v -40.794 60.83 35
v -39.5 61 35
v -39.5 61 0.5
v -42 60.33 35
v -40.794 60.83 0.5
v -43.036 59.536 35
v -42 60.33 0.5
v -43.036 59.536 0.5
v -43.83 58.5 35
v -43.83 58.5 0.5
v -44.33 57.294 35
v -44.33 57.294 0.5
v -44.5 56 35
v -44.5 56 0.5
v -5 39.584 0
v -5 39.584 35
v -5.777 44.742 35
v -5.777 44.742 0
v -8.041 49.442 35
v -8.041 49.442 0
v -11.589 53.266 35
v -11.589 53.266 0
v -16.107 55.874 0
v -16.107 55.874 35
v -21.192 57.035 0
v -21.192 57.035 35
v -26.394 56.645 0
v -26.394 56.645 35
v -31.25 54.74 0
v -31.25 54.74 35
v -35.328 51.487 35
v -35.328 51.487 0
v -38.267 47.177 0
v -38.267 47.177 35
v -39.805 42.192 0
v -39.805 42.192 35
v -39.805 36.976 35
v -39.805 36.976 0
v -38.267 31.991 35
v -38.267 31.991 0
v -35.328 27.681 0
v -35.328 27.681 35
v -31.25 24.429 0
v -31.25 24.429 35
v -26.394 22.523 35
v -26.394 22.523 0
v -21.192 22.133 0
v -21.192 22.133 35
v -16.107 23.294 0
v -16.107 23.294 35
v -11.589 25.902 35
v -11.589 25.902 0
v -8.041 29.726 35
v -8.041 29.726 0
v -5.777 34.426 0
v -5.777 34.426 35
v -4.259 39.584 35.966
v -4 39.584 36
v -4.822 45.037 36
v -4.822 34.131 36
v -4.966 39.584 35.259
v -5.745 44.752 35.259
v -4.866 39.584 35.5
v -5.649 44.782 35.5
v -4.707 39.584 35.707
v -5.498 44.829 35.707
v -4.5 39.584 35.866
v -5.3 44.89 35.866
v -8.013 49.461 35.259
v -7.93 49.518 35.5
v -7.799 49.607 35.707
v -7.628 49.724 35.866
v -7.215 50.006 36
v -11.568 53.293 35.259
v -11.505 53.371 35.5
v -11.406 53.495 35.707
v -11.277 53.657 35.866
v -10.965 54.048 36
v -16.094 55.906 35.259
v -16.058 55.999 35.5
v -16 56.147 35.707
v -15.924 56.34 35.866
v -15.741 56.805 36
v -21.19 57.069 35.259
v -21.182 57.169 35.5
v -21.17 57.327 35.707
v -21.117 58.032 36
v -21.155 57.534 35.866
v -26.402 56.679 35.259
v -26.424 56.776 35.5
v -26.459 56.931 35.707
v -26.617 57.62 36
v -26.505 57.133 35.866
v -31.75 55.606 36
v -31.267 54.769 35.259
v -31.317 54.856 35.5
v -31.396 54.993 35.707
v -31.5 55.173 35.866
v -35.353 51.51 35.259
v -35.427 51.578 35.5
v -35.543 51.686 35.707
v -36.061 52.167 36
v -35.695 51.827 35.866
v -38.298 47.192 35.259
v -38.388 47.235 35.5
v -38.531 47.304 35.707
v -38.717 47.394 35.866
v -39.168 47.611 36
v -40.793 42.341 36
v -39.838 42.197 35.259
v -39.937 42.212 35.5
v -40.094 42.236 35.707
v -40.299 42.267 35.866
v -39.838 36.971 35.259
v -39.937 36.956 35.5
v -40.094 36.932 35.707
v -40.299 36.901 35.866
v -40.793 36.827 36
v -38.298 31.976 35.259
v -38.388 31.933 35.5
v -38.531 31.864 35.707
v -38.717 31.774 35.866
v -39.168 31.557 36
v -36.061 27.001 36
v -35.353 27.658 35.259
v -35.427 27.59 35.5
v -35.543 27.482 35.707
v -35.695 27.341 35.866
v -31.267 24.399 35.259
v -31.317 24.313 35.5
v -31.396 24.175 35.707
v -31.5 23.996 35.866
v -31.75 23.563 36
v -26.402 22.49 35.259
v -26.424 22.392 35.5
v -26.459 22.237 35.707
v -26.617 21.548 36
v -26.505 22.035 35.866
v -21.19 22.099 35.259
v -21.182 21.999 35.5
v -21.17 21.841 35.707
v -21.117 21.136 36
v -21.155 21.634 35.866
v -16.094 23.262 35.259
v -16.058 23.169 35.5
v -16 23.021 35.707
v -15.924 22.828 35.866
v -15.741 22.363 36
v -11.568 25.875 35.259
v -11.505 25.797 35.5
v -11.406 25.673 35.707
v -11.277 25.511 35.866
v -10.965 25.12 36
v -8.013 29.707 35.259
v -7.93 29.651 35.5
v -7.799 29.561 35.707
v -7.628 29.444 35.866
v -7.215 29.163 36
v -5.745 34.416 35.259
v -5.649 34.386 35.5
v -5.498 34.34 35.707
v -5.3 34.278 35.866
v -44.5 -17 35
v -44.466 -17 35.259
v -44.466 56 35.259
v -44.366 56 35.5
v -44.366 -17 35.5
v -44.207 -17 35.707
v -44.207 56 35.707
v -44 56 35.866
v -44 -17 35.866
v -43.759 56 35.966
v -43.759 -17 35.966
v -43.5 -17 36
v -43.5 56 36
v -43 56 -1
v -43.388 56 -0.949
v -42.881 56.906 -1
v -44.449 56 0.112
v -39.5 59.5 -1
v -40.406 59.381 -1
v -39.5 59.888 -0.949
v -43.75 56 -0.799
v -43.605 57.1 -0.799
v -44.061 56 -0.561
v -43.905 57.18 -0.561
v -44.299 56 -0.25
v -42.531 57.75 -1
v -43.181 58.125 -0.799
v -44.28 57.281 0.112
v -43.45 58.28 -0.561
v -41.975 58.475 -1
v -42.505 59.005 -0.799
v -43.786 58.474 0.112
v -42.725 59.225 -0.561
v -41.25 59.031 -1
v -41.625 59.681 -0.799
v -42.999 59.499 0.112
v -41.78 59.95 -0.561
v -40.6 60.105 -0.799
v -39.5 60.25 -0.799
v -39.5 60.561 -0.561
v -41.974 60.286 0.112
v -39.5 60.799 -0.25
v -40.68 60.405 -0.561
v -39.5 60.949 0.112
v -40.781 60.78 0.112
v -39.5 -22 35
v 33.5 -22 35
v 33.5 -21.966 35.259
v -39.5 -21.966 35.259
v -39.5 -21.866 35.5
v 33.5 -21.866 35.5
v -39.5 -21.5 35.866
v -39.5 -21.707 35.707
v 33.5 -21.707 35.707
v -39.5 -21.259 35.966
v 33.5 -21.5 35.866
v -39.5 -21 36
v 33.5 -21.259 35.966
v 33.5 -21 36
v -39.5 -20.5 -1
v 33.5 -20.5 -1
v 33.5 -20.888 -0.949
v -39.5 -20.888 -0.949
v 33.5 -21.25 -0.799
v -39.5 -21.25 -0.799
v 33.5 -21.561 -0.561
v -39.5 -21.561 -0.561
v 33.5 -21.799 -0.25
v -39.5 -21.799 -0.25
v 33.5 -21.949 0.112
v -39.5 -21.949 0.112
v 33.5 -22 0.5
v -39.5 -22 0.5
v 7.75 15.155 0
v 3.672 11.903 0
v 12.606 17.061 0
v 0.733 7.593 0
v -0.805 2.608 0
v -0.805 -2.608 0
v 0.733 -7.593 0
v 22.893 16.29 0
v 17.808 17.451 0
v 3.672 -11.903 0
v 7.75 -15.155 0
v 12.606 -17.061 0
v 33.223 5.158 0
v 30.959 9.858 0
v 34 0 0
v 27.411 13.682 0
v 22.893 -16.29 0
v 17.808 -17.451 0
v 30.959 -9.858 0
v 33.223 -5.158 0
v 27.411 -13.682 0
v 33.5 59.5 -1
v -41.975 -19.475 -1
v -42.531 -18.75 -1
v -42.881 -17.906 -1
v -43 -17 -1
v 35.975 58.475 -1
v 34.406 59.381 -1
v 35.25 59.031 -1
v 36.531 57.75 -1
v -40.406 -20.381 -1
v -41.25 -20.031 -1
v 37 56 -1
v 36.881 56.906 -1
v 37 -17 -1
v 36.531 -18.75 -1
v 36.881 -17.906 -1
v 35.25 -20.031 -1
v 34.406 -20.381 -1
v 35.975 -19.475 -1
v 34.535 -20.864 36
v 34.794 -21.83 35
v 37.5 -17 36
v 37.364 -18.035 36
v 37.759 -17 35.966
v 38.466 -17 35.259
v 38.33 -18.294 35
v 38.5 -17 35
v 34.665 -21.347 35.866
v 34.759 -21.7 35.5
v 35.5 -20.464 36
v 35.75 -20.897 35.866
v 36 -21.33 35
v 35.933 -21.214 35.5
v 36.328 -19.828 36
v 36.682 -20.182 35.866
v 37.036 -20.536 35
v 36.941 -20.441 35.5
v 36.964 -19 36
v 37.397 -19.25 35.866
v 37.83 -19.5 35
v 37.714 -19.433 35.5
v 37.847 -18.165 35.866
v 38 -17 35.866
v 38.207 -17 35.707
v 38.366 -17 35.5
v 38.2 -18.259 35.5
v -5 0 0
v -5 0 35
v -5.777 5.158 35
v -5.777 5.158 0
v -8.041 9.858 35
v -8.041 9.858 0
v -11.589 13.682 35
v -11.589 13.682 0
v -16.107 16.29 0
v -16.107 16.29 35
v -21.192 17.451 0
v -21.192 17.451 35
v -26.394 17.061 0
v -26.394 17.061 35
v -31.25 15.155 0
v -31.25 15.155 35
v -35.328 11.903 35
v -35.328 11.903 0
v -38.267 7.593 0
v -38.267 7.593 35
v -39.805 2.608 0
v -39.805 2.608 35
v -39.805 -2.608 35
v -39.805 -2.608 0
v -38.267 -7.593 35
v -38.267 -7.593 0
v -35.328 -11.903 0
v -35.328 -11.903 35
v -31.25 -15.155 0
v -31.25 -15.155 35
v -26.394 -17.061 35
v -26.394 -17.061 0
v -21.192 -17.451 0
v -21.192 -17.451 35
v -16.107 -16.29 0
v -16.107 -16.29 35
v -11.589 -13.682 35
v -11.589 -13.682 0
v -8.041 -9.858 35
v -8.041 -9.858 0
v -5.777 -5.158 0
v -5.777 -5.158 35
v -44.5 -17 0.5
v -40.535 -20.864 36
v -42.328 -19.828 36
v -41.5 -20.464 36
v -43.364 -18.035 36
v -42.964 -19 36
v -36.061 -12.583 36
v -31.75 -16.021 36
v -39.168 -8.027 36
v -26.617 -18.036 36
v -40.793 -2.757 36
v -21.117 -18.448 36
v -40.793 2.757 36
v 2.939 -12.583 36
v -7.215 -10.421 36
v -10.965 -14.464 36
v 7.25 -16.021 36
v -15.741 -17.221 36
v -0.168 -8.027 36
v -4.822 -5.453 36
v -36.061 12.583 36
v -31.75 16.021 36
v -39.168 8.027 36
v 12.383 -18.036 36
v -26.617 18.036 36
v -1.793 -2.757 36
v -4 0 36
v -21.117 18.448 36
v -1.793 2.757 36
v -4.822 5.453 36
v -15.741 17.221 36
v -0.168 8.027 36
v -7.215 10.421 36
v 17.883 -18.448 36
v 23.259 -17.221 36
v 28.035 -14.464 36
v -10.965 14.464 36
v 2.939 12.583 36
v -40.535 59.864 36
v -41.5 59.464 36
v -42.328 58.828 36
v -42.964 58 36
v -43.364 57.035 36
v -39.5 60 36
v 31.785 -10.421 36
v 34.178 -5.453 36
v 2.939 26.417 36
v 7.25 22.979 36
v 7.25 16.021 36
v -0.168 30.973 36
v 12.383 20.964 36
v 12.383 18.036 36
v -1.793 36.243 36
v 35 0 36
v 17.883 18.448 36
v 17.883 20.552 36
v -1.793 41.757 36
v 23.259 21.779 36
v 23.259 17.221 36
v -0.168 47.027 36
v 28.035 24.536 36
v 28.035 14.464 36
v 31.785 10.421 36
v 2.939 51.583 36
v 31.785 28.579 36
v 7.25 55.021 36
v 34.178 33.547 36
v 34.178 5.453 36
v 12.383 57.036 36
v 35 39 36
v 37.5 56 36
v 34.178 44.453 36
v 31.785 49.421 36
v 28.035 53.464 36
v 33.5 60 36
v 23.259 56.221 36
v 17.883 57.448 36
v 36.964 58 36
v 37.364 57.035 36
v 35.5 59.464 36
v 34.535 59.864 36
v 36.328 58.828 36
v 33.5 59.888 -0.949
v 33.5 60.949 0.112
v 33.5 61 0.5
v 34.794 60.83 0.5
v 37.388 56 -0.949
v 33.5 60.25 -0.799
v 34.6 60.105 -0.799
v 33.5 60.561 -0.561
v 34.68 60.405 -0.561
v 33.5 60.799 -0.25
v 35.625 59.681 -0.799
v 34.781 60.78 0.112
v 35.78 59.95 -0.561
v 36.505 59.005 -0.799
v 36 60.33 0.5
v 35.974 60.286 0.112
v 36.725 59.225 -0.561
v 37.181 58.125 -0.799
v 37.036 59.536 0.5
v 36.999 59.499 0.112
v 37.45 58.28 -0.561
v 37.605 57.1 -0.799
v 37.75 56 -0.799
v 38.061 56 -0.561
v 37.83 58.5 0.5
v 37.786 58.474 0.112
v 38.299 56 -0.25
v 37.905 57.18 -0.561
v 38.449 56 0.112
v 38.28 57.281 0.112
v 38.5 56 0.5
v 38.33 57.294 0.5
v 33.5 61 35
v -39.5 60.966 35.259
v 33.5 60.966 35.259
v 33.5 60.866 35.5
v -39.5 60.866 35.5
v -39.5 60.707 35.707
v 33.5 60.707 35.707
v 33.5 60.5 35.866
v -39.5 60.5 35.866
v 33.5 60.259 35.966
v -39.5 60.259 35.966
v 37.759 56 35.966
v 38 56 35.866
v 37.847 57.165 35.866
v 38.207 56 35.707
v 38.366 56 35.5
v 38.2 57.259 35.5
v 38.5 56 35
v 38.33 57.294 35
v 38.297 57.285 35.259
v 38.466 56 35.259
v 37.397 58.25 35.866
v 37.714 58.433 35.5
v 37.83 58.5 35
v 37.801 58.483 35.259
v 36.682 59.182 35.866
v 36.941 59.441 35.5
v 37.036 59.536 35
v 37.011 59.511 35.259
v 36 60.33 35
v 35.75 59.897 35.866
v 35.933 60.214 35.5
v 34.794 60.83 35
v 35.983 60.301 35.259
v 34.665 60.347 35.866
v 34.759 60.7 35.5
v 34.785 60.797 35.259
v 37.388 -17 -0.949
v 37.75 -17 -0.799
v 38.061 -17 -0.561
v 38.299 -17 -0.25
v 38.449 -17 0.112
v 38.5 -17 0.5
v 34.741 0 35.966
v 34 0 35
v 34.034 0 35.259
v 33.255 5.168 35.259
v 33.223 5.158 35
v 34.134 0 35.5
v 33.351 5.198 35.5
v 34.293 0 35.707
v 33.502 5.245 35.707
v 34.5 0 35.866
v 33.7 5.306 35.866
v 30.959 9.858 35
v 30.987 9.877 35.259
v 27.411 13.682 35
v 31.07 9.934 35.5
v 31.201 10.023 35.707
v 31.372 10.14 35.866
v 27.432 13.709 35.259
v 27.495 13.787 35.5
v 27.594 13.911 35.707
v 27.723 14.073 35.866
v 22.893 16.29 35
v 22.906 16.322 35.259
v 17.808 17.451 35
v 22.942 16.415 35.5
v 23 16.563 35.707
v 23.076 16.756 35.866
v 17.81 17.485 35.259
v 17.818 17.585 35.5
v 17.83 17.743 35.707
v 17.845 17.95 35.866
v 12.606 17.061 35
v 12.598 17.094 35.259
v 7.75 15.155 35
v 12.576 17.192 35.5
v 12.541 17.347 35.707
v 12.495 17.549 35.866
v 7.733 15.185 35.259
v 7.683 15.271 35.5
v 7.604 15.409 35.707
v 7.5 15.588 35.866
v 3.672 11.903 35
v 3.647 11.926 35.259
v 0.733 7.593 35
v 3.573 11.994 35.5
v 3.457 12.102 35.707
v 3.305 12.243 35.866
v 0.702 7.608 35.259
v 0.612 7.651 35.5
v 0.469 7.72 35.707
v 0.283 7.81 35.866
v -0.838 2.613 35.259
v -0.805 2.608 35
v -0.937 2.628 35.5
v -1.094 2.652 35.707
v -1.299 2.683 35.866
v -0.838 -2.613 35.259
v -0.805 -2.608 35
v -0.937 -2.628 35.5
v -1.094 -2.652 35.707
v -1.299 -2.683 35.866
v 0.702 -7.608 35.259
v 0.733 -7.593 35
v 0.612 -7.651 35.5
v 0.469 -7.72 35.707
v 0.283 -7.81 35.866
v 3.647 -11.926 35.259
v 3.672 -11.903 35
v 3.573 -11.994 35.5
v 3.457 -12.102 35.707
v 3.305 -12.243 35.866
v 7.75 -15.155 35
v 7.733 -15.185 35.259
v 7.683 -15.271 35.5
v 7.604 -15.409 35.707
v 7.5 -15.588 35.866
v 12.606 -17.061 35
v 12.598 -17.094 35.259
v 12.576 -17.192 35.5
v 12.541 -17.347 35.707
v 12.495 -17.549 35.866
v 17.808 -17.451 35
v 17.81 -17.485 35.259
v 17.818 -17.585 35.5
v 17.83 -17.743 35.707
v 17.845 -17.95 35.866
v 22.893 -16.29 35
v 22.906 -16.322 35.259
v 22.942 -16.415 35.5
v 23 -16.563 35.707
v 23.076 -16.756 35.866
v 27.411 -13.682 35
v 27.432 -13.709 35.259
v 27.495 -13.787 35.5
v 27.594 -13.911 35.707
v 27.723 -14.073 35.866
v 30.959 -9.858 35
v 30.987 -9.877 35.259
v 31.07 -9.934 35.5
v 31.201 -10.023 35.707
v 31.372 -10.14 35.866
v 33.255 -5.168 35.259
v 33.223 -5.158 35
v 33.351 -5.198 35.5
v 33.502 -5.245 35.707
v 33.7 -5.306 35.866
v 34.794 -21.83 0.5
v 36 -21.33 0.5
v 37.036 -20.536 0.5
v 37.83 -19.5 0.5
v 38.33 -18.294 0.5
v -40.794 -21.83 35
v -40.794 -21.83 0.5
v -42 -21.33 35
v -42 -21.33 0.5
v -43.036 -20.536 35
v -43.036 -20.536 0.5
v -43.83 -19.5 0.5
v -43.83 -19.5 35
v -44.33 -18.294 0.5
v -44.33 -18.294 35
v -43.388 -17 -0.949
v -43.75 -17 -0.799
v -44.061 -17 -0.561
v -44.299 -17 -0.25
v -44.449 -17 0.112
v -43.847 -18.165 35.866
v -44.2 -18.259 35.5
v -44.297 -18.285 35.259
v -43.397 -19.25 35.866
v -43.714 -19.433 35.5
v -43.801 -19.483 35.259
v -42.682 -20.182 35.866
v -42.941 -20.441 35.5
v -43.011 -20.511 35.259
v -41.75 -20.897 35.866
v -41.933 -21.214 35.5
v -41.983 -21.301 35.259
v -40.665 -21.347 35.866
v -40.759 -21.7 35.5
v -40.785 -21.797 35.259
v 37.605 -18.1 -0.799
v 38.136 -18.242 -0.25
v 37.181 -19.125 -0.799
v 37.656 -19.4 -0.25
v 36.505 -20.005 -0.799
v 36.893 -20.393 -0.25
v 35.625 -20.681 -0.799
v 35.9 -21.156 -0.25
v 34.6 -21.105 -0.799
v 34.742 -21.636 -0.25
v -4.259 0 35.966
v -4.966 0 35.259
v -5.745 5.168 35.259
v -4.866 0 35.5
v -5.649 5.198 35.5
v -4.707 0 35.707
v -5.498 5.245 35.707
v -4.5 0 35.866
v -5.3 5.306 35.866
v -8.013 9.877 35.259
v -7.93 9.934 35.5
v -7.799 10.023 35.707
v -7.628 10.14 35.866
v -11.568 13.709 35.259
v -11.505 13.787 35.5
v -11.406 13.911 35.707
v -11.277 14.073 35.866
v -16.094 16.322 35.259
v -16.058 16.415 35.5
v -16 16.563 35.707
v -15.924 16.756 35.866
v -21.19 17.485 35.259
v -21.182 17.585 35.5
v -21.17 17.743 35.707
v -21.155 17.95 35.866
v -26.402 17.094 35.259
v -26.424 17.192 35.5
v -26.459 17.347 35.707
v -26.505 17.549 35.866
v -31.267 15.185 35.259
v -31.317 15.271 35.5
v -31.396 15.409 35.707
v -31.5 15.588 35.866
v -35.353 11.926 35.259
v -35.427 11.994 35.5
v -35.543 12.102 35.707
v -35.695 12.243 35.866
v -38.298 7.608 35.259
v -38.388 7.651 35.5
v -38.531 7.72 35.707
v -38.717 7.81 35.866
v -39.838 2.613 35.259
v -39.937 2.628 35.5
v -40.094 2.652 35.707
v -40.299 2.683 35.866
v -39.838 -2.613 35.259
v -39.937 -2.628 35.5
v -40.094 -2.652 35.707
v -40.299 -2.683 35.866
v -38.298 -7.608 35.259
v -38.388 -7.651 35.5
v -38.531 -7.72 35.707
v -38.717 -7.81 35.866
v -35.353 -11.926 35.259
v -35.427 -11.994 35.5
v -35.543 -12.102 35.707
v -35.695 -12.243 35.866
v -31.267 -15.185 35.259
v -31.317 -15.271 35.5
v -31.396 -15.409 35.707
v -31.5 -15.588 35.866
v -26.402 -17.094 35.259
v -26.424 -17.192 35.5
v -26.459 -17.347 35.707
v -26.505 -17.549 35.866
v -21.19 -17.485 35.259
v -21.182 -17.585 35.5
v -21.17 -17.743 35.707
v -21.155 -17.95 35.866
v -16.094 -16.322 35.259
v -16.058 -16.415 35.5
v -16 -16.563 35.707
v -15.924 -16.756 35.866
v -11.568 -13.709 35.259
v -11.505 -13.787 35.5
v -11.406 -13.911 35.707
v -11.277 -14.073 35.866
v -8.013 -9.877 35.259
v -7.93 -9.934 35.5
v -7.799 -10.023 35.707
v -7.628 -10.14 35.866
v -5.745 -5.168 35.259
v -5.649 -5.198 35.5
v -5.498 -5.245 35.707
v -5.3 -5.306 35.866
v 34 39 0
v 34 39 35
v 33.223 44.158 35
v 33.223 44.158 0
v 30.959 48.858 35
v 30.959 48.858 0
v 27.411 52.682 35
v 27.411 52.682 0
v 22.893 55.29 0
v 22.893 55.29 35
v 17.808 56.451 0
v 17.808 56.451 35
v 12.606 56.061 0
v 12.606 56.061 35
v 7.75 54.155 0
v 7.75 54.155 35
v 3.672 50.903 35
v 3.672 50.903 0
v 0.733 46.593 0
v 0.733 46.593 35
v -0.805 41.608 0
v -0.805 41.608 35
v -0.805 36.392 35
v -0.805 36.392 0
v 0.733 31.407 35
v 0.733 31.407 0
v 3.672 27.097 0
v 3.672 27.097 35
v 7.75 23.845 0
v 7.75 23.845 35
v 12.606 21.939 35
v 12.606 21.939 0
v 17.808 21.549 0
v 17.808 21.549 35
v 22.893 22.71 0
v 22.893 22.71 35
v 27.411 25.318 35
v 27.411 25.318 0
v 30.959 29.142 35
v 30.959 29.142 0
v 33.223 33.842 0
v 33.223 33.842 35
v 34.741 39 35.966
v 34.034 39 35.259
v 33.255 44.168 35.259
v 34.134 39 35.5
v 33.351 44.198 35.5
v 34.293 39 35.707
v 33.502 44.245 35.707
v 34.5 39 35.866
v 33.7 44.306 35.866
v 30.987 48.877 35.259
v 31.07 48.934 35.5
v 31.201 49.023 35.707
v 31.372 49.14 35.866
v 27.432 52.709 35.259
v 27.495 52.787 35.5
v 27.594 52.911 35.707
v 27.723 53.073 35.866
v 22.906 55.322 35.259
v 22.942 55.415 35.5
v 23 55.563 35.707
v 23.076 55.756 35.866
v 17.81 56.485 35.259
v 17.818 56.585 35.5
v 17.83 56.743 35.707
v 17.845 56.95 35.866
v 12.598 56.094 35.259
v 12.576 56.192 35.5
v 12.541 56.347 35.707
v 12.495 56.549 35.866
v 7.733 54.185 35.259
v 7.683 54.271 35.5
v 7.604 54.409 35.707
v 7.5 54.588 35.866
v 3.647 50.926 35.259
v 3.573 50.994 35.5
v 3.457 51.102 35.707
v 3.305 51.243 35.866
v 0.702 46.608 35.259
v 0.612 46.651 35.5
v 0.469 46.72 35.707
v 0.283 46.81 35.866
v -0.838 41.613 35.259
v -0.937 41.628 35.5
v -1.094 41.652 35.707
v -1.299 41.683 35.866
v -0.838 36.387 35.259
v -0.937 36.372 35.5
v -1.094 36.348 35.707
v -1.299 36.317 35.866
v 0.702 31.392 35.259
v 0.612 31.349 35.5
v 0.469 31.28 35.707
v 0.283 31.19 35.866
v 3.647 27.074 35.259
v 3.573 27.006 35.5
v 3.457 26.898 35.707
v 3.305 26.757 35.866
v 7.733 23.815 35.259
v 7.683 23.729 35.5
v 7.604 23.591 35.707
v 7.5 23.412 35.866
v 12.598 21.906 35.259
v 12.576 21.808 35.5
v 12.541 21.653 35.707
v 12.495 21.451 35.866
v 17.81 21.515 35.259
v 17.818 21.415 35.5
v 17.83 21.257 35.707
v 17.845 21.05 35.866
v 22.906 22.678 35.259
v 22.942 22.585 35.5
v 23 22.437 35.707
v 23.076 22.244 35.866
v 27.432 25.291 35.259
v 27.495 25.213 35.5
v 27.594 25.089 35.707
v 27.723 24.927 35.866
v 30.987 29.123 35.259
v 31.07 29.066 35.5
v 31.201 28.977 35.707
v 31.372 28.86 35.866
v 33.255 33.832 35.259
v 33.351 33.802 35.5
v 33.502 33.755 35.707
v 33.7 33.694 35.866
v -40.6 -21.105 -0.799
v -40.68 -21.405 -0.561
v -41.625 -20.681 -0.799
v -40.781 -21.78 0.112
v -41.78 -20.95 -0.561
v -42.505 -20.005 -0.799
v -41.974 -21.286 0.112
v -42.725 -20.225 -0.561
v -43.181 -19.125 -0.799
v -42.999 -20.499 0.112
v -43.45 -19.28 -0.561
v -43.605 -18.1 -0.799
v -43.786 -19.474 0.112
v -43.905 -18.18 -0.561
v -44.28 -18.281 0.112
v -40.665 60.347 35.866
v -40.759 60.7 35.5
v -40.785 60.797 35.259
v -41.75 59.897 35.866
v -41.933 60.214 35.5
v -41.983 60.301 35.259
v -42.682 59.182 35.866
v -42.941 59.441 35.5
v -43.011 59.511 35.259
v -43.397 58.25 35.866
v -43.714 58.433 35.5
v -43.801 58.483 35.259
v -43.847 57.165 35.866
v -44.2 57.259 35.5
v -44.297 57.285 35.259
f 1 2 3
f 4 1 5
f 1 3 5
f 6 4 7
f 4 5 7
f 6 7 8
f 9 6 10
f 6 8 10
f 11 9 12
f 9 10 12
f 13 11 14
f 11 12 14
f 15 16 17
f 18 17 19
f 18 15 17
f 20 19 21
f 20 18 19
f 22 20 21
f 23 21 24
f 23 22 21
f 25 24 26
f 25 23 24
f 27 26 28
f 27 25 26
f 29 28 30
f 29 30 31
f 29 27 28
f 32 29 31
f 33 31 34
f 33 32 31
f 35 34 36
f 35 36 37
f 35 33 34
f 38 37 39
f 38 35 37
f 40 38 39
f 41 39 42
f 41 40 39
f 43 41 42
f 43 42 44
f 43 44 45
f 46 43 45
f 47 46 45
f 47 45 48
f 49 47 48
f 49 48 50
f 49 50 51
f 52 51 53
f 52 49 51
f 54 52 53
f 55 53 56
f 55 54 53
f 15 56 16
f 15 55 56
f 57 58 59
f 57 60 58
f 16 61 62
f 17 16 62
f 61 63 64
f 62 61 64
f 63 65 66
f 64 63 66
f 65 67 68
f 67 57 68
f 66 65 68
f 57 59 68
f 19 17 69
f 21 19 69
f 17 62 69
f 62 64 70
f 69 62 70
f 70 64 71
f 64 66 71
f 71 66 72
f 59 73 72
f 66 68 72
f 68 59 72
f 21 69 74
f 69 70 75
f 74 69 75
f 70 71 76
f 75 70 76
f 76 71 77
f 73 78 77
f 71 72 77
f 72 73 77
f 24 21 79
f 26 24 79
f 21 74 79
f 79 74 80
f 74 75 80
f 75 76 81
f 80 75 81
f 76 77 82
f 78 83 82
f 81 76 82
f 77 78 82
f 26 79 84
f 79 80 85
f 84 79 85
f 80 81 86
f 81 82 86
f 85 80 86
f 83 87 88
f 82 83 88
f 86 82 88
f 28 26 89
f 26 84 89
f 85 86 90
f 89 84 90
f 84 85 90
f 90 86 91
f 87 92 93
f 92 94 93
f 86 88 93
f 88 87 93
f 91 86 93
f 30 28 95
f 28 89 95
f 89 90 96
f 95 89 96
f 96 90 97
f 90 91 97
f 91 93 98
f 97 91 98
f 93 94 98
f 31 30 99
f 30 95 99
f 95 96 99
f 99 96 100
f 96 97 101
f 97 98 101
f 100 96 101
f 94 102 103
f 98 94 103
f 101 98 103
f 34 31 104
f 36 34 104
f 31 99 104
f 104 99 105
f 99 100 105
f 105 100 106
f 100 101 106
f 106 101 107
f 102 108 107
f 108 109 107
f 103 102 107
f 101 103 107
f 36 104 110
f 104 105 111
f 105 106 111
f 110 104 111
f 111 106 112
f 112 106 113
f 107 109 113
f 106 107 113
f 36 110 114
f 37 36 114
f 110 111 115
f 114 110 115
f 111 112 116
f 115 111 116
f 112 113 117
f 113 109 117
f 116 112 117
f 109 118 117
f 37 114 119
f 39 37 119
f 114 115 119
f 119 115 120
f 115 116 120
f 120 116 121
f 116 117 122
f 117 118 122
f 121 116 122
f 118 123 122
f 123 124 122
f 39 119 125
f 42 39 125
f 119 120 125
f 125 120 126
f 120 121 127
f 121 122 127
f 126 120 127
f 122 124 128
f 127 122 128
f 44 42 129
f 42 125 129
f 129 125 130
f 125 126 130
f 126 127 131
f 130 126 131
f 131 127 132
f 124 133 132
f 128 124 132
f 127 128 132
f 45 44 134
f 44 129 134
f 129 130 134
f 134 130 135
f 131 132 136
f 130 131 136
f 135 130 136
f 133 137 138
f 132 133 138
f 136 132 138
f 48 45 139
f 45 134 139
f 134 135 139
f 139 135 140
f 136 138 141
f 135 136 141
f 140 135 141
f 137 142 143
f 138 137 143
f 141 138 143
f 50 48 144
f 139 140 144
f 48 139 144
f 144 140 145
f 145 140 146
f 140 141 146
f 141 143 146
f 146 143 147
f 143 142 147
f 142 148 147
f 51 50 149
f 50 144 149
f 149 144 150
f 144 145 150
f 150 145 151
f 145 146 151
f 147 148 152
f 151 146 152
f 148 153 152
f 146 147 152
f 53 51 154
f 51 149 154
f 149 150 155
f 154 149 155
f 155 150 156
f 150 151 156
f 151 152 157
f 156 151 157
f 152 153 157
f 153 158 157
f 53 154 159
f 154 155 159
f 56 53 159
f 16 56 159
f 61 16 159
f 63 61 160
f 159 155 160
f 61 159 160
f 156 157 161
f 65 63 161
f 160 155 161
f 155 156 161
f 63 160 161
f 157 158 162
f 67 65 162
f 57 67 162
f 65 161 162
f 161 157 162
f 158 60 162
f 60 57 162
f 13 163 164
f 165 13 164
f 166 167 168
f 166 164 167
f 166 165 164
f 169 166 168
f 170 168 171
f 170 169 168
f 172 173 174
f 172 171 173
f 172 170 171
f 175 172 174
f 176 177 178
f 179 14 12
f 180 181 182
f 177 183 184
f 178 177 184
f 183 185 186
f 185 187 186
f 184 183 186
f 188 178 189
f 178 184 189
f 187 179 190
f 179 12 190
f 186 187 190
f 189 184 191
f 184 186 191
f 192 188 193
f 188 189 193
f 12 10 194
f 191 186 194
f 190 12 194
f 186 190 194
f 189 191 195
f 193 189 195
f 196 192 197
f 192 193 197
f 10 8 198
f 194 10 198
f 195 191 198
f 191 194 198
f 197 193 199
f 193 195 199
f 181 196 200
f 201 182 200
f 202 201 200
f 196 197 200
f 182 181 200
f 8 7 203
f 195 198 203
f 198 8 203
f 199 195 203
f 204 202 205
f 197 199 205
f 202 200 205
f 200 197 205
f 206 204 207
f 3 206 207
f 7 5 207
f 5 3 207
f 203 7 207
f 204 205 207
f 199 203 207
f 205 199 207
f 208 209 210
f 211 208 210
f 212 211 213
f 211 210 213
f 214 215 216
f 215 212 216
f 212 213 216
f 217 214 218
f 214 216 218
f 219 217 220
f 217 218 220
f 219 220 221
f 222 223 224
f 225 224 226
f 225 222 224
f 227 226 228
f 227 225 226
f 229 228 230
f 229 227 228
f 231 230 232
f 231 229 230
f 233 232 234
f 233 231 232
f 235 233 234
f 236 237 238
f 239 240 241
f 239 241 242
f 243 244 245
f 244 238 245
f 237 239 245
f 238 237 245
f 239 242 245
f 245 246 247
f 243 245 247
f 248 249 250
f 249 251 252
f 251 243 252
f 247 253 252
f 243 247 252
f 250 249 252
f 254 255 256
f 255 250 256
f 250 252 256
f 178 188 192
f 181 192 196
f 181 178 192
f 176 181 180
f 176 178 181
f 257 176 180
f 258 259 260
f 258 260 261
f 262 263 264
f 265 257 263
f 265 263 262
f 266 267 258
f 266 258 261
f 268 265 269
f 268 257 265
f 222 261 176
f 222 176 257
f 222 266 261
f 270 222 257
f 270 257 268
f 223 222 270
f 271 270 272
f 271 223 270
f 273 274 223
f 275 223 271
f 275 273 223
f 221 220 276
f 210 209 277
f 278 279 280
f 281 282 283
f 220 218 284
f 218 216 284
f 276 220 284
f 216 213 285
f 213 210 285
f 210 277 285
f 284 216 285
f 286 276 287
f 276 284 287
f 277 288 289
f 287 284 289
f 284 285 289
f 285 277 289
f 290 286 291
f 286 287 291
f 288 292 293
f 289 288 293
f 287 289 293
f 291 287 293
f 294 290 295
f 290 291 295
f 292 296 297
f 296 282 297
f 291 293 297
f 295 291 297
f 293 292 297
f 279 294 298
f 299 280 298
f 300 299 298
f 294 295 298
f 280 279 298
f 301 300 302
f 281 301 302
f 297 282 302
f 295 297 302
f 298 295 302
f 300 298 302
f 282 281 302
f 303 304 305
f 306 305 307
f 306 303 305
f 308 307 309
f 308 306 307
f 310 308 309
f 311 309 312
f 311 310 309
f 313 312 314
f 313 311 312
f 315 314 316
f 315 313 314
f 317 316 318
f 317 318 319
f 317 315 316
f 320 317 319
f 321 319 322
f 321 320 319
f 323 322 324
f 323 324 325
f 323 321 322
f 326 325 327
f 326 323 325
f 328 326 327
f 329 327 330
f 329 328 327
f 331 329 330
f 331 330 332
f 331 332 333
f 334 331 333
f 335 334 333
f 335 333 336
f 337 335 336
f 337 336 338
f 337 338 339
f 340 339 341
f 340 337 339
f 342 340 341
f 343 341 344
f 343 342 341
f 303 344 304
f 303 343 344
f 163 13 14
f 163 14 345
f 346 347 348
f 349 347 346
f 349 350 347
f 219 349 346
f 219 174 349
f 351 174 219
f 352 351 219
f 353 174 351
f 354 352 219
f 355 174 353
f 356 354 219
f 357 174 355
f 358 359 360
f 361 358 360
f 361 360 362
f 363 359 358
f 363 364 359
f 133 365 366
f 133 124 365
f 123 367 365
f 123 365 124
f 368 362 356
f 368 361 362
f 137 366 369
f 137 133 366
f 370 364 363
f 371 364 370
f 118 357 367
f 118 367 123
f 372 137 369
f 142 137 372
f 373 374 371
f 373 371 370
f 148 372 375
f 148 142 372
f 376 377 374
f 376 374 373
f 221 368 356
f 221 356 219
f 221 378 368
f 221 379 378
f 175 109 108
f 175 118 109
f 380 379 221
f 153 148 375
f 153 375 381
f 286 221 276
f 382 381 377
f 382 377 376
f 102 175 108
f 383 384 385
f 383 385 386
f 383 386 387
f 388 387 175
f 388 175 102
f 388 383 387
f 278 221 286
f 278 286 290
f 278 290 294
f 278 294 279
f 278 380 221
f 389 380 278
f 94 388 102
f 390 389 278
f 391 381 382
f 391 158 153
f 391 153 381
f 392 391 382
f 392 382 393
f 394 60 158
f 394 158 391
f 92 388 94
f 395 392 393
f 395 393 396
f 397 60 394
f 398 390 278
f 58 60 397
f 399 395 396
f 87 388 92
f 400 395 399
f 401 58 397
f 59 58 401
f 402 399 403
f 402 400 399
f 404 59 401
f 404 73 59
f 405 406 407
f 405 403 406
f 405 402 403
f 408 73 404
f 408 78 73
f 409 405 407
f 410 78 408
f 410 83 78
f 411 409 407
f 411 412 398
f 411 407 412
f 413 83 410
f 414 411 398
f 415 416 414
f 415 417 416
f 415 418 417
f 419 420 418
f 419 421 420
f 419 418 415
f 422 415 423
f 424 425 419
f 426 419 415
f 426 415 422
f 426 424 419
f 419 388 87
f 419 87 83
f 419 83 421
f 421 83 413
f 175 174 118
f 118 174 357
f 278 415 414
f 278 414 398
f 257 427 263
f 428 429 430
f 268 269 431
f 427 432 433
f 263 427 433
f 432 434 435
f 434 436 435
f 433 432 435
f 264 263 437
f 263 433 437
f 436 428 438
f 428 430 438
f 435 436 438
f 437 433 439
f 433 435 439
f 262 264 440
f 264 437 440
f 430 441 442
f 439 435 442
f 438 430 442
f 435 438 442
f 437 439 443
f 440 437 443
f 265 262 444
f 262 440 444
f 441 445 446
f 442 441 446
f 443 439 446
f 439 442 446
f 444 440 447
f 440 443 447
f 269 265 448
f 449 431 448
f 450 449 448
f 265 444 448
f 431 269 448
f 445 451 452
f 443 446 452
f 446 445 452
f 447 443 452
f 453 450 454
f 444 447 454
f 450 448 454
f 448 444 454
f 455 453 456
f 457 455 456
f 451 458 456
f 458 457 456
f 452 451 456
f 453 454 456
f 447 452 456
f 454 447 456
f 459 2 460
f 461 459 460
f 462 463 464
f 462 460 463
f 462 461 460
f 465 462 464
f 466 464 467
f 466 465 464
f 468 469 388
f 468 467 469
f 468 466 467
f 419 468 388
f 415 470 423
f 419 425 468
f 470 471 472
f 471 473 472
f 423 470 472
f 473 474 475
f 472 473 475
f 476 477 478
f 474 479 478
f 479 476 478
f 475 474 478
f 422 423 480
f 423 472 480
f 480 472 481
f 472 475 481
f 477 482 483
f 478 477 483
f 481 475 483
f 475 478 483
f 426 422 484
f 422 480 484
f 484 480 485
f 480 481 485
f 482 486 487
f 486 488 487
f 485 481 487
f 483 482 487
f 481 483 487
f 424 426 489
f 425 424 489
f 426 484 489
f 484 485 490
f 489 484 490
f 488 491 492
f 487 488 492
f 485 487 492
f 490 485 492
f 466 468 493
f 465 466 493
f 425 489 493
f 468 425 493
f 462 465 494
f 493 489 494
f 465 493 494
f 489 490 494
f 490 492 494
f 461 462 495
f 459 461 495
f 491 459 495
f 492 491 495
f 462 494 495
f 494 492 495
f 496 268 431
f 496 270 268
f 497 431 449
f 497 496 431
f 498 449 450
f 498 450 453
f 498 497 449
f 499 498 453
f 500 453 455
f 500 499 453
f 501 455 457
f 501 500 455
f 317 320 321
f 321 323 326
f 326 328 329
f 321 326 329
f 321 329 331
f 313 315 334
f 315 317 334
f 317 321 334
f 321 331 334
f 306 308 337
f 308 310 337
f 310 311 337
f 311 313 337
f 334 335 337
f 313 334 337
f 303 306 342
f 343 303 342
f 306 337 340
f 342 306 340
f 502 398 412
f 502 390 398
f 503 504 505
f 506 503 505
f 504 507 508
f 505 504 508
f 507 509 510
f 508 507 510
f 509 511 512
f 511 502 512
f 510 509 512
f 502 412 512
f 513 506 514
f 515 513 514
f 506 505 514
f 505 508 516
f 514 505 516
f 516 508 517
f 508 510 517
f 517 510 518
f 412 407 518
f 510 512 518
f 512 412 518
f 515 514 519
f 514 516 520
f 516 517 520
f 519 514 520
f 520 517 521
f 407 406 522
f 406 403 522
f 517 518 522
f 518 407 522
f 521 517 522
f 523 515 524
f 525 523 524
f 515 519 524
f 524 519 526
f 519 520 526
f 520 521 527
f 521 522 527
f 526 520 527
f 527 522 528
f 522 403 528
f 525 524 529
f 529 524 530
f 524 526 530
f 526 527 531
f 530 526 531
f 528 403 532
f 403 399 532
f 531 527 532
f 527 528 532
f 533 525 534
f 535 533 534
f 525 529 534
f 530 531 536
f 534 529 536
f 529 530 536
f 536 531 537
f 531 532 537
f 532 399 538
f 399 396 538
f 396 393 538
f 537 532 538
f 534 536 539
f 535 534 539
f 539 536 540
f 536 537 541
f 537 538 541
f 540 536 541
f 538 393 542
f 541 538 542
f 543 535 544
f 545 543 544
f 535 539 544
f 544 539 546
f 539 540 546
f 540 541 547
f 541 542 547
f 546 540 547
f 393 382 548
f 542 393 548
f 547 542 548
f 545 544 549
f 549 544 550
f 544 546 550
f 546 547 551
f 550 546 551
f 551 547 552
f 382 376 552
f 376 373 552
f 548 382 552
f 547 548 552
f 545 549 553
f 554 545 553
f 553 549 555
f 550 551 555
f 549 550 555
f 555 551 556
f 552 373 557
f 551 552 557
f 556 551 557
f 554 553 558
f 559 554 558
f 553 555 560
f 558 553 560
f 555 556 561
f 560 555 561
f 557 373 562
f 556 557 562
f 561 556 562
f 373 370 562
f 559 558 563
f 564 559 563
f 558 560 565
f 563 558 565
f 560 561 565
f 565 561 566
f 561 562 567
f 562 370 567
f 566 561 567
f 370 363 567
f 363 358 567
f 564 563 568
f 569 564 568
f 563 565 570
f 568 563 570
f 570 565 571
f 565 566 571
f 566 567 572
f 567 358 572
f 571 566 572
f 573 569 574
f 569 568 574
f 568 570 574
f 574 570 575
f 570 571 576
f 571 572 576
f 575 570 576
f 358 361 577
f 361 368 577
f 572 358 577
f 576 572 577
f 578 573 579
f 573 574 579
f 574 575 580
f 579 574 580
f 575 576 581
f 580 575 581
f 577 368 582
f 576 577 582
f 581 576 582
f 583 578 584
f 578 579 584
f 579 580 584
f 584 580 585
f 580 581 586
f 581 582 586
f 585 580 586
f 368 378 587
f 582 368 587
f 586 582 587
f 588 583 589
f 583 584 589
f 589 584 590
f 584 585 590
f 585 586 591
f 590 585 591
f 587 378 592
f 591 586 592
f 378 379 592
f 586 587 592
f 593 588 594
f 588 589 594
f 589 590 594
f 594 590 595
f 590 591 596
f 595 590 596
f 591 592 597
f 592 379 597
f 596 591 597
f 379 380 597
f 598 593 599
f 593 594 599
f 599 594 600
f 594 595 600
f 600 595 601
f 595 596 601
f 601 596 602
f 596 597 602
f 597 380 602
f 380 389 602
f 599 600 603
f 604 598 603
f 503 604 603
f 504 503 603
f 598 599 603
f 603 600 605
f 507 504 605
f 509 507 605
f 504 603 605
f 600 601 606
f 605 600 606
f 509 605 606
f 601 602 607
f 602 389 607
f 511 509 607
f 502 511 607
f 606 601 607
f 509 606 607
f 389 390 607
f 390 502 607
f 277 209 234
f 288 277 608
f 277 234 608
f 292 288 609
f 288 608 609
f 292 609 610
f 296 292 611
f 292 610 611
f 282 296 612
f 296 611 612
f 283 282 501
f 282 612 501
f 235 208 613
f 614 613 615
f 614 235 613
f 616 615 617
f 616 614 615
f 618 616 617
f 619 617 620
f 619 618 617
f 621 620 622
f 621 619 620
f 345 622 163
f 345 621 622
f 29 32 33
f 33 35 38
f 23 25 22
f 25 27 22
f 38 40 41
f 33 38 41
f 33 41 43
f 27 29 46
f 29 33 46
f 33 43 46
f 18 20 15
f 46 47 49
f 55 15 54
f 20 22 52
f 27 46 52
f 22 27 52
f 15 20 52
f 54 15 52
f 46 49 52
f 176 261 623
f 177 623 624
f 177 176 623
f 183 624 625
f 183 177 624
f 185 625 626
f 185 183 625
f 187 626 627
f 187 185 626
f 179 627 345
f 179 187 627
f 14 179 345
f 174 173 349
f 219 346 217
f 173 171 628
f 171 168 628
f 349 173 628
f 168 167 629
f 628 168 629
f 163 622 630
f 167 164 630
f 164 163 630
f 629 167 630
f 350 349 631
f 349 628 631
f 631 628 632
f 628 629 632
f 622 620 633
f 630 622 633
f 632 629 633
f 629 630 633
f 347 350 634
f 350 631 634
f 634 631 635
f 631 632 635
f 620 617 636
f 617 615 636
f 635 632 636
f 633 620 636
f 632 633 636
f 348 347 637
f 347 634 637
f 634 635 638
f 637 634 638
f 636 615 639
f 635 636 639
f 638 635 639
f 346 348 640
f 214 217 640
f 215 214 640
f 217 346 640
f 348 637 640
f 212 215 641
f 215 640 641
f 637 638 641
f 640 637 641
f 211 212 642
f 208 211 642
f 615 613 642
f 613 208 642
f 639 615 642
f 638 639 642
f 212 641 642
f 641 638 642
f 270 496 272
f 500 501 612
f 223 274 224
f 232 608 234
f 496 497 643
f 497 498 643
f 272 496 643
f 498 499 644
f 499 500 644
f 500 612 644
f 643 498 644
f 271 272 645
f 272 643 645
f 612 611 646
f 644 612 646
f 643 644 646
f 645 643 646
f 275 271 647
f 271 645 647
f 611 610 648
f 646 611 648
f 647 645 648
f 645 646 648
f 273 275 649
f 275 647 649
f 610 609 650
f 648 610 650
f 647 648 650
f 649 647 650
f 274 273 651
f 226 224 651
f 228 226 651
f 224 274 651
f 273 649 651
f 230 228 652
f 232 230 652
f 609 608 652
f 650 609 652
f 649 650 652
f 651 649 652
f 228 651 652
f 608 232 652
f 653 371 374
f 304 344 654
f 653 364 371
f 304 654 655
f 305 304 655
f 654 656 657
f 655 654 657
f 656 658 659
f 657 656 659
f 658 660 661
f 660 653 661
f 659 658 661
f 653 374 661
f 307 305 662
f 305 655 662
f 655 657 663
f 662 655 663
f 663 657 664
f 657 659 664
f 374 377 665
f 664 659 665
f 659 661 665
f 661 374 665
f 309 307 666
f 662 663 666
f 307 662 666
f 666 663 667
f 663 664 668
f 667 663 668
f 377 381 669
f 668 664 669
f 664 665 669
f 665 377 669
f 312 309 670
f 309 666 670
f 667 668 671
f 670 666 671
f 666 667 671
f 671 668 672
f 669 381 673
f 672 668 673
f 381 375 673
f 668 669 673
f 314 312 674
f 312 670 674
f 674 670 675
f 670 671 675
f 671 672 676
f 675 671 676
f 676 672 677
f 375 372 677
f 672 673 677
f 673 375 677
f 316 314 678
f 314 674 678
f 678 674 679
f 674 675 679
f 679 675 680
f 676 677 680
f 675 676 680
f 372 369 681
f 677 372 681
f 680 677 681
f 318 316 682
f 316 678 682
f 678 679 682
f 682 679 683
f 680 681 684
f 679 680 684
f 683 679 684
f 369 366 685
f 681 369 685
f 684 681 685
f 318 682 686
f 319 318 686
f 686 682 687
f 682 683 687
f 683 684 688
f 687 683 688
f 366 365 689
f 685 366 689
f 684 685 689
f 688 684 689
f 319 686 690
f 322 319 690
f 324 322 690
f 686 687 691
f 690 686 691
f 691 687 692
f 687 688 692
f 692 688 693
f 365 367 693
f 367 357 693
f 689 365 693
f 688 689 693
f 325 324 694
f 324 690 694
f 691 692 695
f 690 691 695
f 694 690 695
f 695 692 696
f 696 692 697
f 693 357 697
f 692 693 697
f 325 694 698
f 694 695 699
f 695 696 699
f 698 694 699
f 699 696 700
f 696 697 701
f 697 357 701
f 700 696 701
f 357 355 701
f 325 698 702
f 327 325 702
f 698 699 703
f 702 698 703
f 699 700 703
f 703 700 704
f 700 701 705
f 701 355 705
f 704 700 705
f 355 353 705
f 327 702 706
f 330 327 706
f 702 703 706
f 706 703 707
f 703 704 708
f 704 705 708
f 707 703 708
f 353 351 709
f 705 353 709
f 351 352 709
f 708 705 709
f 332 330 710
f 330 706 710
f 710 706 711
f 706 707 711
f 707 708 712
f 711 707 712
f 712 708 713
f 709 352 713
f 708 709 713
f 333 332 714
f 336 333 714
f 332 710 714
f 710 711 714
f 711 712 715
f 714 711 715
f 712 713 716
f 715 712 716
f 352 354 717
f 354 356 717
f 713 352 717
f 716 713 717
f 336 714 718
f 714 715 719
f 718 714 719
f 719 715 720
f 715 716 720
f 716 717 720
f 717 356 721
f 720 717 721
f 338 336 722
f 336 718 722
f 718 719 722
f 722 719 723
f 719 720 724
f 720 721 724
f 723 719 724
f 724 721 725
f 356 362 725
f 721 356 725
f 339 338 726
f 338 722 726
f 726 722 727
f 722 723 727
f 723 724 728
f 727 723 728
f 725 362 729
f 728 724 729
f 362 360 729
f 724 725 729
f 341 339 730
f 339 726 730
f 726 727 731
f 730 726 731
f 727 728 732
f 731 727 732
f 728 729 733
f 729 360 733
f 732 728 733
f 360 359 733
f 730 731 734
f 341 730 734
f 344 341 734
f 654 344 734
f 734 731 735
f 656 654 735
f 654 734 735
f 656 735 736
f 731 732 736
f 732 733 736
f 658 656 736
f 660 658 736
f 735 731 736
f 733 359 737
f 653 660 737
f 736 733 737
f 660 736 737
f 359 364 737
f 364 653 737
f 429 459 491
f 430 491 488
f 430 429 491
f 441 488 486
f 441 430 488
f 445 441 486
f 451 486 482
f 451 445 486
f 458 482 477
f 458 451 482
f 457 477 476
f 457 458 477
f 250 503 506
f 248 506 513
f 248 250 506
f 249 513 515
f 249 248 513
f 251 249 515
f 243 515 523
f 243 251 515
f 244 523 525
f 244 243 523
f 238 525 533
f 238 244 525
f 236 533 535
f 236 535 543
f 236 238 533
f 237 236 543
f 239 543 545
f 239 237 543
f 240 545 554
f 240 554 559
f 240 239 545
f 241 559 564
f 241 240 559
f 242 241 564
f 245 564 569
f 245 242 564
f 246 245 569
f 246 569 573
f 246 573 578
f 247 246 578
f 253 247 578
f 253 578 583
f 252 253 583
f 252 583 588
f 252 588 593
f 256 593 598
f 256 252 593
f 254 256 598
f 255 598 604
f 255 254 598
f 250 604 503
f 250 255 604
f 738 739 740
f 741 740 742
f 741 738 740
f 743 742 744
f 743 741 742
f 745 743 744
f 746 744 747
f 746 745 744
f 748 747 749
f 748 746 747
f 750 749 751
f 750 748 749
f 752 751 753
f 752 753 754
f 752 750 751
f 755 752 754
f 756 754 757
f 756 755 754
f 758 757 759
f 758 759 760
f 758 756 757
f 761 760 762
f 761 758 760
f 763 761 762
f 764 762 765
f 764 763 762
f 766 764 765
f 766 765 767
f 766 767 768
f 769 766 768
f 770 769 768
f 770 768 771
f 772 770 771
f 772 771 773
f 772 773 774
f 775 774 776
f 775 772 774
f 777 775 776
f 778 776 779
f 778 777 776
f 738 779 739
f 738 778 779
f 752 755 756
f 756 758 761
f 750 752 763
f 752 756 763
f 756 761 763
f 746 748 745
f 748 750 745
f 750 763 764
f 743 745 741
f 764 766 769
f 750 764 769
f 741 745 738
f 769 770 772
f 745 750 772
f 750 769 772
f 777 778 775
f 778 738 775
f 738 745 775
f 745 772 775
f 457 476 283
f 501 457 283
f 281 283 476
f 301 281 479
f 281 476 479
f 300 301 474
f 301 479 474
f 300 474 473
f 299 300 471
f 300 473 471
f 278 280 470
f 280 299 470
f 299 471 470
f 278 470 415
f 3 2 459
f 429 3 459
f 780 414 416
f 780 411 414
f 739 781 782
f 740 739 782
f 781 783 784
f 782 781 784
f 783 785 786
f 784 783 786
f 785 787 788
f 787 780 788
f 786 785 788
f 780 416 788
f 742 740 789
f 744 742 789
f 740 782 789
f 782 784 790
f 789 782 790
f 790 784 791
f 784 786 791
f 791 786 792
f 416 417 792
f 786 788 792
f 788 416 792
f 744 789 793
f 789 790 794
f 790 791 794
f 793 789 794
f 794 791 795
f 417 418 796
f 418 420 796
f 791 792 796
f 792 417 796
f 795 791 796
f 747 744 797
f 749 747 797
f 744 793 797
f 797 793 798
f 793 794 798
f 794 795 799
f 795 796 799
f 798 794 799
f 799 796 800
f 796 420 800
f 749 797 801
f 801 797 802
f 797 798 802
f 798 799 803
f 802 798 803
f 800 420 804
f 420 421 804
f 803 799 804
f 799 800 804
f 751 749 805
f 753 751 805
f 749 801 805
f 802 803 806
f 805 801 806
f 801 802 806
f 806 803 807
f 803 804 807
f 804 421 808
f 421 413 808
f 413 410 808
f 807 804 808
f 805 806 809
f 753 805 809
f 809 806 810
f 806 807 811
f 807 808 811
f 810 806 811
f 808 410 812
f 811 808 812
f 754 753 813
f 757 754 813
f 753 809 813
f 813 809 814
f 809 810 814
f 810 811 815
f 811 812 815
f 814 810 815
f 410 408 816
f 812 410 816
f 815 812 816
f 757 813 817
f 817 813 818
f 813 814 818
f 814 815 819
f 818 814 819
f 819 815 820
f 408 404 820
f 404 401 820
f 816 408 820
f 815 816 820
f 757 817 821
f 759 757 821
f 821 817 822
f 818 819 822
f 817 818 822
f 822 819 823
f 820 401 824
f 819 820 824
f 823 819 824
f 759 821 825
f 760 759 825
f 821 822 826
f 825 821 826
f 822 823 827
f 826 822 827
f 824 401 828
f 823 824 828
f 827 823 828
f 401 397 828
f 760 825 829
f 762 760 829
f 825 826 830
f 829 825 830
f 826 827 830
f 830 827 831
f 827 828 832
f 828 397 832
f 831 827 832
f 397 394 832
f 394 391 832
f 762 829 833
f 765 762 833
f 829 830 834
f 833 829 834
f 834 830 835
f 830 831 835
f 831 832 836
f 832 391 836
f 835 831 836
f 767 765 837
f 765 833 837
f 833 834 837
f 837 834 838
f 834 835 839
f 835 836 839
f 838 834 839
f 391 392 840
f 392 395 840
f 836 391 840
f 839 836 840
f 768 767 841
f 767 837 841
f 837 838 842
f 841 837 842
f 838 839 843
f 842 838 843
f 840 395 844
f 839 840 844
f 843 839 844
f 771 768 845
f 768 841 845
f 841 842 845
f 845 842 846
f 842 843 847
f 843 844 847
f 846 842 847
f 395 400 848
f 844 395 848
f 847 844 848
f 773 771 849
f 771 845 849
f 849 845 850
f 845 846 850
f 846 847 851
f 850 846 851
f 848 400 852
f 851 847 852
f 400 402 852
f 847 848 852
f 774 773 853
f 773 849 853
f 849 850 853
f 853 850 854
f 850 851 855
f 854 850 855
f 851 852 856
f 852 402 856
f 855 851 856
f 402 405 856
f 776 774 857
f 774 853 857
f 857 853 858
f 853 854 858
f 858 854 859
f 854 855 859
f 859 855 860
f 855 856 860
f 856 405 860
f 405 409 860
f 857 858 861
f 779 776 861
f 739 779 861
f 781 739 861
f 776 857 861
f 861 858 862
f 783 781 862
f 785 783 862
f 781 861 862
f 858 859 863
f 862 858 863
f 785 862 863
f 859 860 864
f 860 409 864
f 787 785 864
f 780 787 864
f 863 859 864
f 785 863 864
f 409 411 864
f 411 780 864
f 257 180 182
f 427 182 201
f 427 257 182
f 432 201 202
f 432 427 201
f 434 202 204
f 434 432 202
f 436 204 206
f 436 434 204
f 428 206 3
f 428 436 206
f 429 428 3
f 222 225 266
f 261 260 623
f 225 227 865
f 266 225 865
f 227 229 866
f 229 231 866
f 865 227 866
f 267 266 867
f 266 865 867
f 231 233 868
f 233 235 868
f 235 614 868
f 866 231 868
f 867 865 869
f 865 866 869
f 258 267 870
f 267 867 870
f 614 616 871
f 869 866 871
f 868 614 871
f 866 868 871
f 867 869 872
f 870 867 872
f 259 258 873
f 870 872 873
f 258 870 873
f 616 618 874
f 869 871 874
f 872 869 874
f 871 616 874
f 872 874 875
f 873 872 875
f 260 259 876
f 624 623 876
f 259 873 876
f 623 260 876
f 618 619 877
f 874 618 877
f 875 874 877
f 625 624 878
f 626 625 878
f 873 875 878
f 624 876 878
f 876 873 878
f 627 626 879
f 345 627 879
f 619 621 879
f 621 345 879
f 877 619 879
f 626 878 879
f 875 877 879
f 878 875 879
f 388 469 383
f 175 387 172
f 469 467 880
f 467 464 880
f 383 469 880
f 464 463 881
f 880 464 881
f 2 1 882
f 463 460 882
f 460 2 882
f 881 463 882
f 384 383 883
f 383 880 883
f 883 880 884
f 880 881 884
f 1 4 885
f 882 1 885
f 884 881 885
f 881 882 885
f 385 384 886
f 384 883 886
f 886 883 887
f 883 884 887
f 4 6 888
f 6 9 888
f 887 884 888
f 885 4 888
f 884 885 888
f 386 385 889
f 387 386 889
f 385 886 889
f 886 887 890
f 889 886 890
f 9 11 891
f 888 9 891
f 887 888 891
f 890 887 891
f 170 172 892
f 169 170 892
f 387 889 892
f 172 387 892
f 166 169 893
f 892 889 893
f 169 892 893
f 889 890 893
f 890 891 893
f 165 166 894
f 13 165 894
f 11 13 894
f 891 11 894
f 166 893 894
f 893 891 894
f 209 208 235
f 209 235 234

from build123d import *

# Parameters (mm, degrees)
F0_W         = 83
F0_H         = 83
F0_R         = 17.5
F1_DEPTH     = 36
F2_R         = 1
F3_W         = 83
F3_H         = 83
F4_DEPTH     = 1
F5_T1_DEPTH  = 49.5
F5_T4_ANGLE  = 90
F5_T6_ANGLE  = 90
F5_T8_ANGLE  = 90
F5_T10_ANGLE = 90
F6_R         = 1.5


# Not quite as in the source:
# - a fillet or chamfer that OpenCascade refuses, or shapes differently, is made with other operations: its cross-section is extruded or revolved along the edge and cut away or added
# - a feature names something its author has since deleted; it is built from what else it names


with BuildPart() as f1:
    # F0 (on Top) → F1 (new body)
    with BuildSketch(Plane.XY):
        with Locations((-3, 19.5)):
            Rectangle(F0_W, F0_H)
        with Locations((-22.5, 0)):
            Circle(F0_R, mode=Mode.SUBTRACT)
        with Locations((16.5, 0)):
            Circle(F0_R, mode=Mode.SUBTRACT)
        with Locations((-22.5, 39.5840890706)):
            Circle(F0_R, mode=Mode.SUBTRACT)
        with Locations((16.5, 39)):
            Circle(F0_R, mode=Mode.SUBTRACT)
    extrude(amount=F1_DEPTH)

    # F2
    f2_edges = [f1.edges().sort_by_distance(p)[0] for p in [
        (-3, 61, 36),
        (-44.5, 19.5, 36),
        (-3, -22, 36),
        (38.5, 19.5, 36),
        (-40, 0, 36),
        (-1, 0, 36),
        (-40, 39.584089, 36),
        (-1, 39, 36),
    ]]
    fillet(f2_edges, radius=F2_R)

    # F3 (on face) → F4 (join)
    with BuildSketch(Plane(origin=(0, 0, 0), x_dir=(1, 0, 0), z_dir=(0, 0, -1))):
        with Locations((-3, -19.5)):
            Rectangle(F3_W, F3_H)
    extrude(amount=F4_DEPTH)

    # F5: fillet of radius 5 on 4 edges, made by hand

    # F5_s2 → F5_t1 (cut)
    with BuildSketch(Plane.XY.offset(-13.5)):
        with BuildLine():
            ThreePointArc((-39.5, 61), (-43.0355339059, 59.5355339059), (-44.5, 56))
            Line((-44.5, 56), (-44.5, 61))
            Line((-44.5, 61), (-39.5, 61))
        make_face()
        with BuildLine():
            ThreePointArc((-39.5, -22), (-43.0355339059, -20.5355339059), (-44.5, -17))
            Line((-44.5, -17), (-44.5, -22))
            Line((-44.5, -22), (-39.5, -22))
        make_face()
        with BuildLine():
            ThreePointArc((33.5, -22), (37.0355339059, -20.5355339059), (38.5, -17))
            Line((38.5, -17), (38.5, -22))
            Line((38.5, -22), (33.5, -22))
        make_face()
        with BuildLine():
            ThreePointArc((33.5, 61), (37.0355339059, 59.5355339059), (38.5, 56))
            Line((38.5, 56), (38.5, 61))
            Line((38.5, 61), (33.5, 61))
        make_face()
    extrude(amount=F5_T1_DEPTH, mode=Mode.SUBTRACT)

    # F5_s3 → F5_t4 (revolve, cut)
    with BuildSketch(Plane.XZ.offset(-56)):
        with BuildLine():
            ThreePointArc((37.5, 36), (38.2071067812, 35.7071067812), (38.5, 35))
            Line((38.5, 35), (38.5, 36))
            Line((38.5, 36), (37.5, 36))
        make_face()
    revolve(axis=Axis((33.5, 56, 36), (0, 0, 1)), revolution_arc=F5_T4_ANGLE, mode=Mode.SUBTRACT)

    # F5_s5 → F5_t6 (revolve, cut)
    with BuildSketch(Plane.YZ.offset(33.5)):
        with BuildLine():
            ThreePointArc((-21, 36), (-21.7071067812, 35.7071067812), (-22, 35))
            Line((-22, 35), (-22, 36))
            Line((-22, 36), (-21, 36))
        make_face()
    revolve(axis=Axis((33.5, -17, 36), (0, 0, 1)), revolution_arc=F5_T6_ANGLE, mode=Mode.SUBTRACT)

    # F5_s7 → F5_t8 (revolve, cut)
    with BuildSketch(Plane.XZ.offset(17)):
        with BuildLine():
            ThreePointArc((-43.5, 36), (-44.2071067812, 35.7071067812), (-44.5, 35))
            Line((-44.5, 35), (-44.5, 36))
            Line((-44.5, 36), (-43.5, 36))
        make_face()
    revolve(axis=Axis((-39.5, -17, 36), (0, 0, 1)), revolution_arc=F5_T8_ANGLE, mode=Mode.SUBTRACT)

    # F5_s9 → F5_t10 (revolve, cut)
    with BuildSketch(Plane.YZ.offset(-39.5)):
        with BuildLine():
            ThreePointArc((60, 36), (60.7071067812, 35.7071067812), (61, 35))
            Line((61, 35), (61, 36))
            Line((61, 36), (60, 36))
        make_face()
    revolve(axis=Axis((-39.5, 56, 36), (0, 0, 1)), revolution_arc=F5_T10_ANGLE, mode=Mode.SUBTRACT)

    # F6
    f6_edges = [f1.edges().sort_by_distance(p)[0] for p in [
        (37.035534, -20.535534, -1),
        (38.5, 19.5, -1),
        (37.035534, 59.535534, -1),
        (-3, 61, -1),
        (-43.035534, 59.535534, -1),
        (-44.5, 19.5, -1),
        (-43.035534, -20.535534, -1),
        (-3, -22, -1),
    ]]
    fillet(f6_edges, radius=F6_R)


solid = f1.part
